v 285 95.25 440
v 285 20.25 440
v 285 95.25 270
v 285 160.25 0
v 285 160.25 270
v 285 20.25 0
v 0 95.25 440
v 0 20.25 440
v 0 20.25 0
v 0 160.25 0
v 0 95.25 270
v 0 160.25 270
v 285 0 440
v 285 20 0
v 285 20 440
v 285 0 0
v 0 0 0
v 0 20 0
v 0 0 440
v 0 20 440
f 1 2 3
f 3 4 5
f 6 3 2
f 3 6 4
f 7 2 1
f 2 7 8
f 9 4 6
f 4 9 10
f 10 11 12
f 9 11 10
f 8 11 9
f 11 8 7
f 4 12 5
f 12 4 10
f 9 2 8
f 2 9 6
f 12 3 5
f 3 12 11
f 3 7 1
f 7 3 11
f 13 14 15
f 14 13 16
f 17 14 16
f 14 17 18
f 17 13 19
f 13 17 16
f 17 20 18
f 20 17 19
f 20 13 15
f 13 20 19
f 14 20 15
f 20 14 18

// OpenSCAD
// file: time_utility.scad
// Utility functions to help manage time steps $t
// 2017/04/28 - Roger Cheng

// Returns 0-1 for the portion of time between start/end.
function timeRanged(start, current, end) = 
    current<=start? 0 : 
        (current>=end ? 1 : 
            ((current-start)/(end-start)));

// Symmetric animation 0 to 1 to 0 while $t goes 0 to 1
function timeSymmetric() = abs($t-0.5)*2;

// A little padding on either end of timeSymmetric()
padStart=0.1;
padEnd=0.9;
function timePadded() = timeRanged(padStart, timeSymmetric(), padEnd);
// main file
// Concept 2-screen Luggable PC hinge visualization
// 2017/04/29 - Roger Cheng
use <time_utility.scad>

// Gap in between pieces for 3D printer tolerance. Also useful for CSG difference()
gap = 0.25;

// Main chassis dimensions

// The width, depth, and height of the bounding box
chassisW = 285;
chassisD = 140;
chassisH = 440;

// The depth and height of the cutout
cutoutD = 65;
cutoutH = 170;

// Screen dimensions, as measured when open (so 90 degrees off from chassis)
screenW = chassisH;
screenH = chassisW;
screenD = 10;


// Chassis bounding box - cutout box
module chassis()
{
    difference() {
        cube([chassisW, chassisD, chassisH]);
        translate([-gap/2, chassisD-cutoutD, chassisH-cutoutH]) 
            cube([chassisW+gap, chassisD-cutoutD+gap, cutoutH+gap]);
    }
}

// Single screen bounding box
module screen()
{
    cube([screenW, screenD, screenH]);
}

// Put an instance of chassis in the space, translated a bit to make room for screen.
color([0, 0, 1])
{
    translate([0, screenD*2+gap, 0])
    {
        chassis();
    }
}

// Screen fold animation
lsFoldStart = 0;
lsFoldEnd = 0.4;
function lsFold() = timeRanged(lsFoldStart, timePadded(), lsFoldEnd);

// Screen rotate animation
sRStart = 0.4;
sREnd = 0.7;
function sRotate() = timeRanged(sRStart, timePadded(), sREnd);

// Screen stowage animation
stowStart = 0.7;
stowEnd = 1.0;
function stow() = timeRanged(stowStart, timePadded(), stowEnd);

// Add two instances of screen into the space
translate([screenH/2, screenD*2, screenW]) // Translate screen assembly hinge to final location
rotate([90*stow(), 0, 0]) // Screen stowage animation
rotate([0, 90*sRotate(), 0]) // Screen rotation
rotate([0, 0, -90*lsFold()]) // Screen assembly folding
translate([0, -screenD, -screenH/2]) // Translate screen assembly hinge to origin
union() // Screen assembly
{
    rotate([0, 0, 180*lsFold()]) // Rotate relative to right screen (hinge between screens)
        translate([-screenW, 0, 0]) // Translate into position relative to right screen.
            color([0, 1, 0]) screen(); // Left screen
    color([1, 0, 0]) screen(); // Right screen
}
